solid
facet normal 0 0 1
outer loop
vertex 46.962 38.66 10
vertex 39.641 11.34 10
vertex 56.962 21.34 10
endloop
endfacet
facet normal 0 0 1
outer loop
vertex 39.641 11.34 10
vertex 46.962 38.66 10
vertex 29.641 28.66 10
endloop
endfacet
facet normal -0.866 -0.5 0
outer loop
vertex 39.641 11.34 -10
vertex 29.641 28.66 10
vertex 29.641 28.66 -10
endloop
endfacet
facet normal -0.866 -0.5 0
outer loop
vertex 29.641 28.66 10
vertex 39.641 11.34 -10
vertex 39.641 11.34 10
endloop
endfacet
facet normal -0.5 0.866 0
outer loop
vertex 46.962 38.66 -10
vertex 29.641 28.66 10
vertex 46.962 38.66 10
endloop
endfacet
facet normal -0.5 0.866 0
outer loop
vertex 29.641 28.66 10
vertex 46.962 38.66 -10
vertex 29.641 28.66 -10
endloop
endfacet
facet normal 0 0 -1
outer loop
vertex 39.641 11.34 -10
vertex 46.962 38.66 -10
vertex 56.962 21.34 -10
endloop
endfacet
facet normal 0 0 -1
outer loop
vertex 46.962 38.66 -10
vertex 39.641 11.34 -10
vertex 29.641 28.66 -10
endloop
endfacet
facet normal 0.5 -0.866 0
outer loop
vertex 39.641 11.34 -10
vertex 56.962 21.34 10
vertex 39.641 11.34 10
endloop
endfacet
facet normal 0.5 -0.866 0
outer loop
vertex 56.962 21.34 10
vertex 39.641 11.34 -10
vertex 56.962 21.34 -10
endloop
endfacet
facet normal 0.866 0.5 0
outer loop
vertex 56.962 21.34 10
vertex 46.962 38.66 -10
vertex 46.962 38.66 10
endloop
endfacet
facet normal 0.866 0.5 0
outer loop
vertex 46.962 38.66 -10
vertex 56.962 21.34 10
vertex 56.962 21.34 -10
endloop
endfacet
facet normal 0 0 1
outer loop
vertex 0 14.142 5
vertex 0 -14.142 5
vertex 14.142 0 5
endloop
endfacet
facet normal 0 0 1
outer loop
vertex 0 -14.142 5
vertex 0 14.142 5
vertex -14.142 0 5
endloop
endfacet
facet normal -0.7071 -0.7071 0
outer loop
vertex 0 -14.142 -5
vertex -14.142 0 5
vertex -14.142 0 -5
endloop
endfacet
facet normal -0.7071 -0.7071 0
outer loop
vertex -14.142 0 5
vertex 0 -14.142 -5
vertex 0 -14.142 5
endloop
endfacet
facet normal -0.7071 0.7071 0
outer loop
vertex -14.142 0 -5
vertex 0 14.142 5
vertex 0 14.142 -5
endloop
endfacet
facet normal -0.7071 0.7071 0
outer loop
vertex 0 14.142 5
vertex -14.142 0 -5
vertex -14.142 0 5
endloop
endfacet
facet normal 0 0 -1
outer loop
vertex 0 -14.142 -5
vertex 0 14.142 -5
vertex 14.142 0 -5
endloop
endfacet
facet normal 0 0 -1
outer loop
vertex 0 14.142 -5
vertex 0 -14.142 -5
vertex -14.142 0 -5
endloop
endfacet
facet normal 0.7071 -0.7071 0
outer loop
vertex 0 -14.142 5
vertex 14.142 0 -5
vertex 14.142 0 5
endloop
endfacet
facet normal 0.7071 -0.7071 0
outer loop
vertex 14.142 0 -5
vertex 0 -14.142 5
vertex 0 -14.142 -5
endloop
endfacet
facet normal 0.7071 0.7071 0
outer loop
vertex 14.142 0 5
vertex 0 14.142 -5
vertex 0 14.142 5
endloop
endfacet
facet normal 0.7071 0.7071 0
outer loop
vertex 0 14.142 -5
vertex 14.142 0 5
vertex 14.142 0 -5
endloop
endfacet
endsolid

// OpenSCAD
//-- Ejemplo translación y rotación

//-- Translación y rotación de un cubo
rotate([0,0,30])
translate([50,0,0])
    cube([20,20,20], center=true);
    
//-- Rotación de un cubo
rotate([0,0,45])
    cube([20,20,10], center=true);
